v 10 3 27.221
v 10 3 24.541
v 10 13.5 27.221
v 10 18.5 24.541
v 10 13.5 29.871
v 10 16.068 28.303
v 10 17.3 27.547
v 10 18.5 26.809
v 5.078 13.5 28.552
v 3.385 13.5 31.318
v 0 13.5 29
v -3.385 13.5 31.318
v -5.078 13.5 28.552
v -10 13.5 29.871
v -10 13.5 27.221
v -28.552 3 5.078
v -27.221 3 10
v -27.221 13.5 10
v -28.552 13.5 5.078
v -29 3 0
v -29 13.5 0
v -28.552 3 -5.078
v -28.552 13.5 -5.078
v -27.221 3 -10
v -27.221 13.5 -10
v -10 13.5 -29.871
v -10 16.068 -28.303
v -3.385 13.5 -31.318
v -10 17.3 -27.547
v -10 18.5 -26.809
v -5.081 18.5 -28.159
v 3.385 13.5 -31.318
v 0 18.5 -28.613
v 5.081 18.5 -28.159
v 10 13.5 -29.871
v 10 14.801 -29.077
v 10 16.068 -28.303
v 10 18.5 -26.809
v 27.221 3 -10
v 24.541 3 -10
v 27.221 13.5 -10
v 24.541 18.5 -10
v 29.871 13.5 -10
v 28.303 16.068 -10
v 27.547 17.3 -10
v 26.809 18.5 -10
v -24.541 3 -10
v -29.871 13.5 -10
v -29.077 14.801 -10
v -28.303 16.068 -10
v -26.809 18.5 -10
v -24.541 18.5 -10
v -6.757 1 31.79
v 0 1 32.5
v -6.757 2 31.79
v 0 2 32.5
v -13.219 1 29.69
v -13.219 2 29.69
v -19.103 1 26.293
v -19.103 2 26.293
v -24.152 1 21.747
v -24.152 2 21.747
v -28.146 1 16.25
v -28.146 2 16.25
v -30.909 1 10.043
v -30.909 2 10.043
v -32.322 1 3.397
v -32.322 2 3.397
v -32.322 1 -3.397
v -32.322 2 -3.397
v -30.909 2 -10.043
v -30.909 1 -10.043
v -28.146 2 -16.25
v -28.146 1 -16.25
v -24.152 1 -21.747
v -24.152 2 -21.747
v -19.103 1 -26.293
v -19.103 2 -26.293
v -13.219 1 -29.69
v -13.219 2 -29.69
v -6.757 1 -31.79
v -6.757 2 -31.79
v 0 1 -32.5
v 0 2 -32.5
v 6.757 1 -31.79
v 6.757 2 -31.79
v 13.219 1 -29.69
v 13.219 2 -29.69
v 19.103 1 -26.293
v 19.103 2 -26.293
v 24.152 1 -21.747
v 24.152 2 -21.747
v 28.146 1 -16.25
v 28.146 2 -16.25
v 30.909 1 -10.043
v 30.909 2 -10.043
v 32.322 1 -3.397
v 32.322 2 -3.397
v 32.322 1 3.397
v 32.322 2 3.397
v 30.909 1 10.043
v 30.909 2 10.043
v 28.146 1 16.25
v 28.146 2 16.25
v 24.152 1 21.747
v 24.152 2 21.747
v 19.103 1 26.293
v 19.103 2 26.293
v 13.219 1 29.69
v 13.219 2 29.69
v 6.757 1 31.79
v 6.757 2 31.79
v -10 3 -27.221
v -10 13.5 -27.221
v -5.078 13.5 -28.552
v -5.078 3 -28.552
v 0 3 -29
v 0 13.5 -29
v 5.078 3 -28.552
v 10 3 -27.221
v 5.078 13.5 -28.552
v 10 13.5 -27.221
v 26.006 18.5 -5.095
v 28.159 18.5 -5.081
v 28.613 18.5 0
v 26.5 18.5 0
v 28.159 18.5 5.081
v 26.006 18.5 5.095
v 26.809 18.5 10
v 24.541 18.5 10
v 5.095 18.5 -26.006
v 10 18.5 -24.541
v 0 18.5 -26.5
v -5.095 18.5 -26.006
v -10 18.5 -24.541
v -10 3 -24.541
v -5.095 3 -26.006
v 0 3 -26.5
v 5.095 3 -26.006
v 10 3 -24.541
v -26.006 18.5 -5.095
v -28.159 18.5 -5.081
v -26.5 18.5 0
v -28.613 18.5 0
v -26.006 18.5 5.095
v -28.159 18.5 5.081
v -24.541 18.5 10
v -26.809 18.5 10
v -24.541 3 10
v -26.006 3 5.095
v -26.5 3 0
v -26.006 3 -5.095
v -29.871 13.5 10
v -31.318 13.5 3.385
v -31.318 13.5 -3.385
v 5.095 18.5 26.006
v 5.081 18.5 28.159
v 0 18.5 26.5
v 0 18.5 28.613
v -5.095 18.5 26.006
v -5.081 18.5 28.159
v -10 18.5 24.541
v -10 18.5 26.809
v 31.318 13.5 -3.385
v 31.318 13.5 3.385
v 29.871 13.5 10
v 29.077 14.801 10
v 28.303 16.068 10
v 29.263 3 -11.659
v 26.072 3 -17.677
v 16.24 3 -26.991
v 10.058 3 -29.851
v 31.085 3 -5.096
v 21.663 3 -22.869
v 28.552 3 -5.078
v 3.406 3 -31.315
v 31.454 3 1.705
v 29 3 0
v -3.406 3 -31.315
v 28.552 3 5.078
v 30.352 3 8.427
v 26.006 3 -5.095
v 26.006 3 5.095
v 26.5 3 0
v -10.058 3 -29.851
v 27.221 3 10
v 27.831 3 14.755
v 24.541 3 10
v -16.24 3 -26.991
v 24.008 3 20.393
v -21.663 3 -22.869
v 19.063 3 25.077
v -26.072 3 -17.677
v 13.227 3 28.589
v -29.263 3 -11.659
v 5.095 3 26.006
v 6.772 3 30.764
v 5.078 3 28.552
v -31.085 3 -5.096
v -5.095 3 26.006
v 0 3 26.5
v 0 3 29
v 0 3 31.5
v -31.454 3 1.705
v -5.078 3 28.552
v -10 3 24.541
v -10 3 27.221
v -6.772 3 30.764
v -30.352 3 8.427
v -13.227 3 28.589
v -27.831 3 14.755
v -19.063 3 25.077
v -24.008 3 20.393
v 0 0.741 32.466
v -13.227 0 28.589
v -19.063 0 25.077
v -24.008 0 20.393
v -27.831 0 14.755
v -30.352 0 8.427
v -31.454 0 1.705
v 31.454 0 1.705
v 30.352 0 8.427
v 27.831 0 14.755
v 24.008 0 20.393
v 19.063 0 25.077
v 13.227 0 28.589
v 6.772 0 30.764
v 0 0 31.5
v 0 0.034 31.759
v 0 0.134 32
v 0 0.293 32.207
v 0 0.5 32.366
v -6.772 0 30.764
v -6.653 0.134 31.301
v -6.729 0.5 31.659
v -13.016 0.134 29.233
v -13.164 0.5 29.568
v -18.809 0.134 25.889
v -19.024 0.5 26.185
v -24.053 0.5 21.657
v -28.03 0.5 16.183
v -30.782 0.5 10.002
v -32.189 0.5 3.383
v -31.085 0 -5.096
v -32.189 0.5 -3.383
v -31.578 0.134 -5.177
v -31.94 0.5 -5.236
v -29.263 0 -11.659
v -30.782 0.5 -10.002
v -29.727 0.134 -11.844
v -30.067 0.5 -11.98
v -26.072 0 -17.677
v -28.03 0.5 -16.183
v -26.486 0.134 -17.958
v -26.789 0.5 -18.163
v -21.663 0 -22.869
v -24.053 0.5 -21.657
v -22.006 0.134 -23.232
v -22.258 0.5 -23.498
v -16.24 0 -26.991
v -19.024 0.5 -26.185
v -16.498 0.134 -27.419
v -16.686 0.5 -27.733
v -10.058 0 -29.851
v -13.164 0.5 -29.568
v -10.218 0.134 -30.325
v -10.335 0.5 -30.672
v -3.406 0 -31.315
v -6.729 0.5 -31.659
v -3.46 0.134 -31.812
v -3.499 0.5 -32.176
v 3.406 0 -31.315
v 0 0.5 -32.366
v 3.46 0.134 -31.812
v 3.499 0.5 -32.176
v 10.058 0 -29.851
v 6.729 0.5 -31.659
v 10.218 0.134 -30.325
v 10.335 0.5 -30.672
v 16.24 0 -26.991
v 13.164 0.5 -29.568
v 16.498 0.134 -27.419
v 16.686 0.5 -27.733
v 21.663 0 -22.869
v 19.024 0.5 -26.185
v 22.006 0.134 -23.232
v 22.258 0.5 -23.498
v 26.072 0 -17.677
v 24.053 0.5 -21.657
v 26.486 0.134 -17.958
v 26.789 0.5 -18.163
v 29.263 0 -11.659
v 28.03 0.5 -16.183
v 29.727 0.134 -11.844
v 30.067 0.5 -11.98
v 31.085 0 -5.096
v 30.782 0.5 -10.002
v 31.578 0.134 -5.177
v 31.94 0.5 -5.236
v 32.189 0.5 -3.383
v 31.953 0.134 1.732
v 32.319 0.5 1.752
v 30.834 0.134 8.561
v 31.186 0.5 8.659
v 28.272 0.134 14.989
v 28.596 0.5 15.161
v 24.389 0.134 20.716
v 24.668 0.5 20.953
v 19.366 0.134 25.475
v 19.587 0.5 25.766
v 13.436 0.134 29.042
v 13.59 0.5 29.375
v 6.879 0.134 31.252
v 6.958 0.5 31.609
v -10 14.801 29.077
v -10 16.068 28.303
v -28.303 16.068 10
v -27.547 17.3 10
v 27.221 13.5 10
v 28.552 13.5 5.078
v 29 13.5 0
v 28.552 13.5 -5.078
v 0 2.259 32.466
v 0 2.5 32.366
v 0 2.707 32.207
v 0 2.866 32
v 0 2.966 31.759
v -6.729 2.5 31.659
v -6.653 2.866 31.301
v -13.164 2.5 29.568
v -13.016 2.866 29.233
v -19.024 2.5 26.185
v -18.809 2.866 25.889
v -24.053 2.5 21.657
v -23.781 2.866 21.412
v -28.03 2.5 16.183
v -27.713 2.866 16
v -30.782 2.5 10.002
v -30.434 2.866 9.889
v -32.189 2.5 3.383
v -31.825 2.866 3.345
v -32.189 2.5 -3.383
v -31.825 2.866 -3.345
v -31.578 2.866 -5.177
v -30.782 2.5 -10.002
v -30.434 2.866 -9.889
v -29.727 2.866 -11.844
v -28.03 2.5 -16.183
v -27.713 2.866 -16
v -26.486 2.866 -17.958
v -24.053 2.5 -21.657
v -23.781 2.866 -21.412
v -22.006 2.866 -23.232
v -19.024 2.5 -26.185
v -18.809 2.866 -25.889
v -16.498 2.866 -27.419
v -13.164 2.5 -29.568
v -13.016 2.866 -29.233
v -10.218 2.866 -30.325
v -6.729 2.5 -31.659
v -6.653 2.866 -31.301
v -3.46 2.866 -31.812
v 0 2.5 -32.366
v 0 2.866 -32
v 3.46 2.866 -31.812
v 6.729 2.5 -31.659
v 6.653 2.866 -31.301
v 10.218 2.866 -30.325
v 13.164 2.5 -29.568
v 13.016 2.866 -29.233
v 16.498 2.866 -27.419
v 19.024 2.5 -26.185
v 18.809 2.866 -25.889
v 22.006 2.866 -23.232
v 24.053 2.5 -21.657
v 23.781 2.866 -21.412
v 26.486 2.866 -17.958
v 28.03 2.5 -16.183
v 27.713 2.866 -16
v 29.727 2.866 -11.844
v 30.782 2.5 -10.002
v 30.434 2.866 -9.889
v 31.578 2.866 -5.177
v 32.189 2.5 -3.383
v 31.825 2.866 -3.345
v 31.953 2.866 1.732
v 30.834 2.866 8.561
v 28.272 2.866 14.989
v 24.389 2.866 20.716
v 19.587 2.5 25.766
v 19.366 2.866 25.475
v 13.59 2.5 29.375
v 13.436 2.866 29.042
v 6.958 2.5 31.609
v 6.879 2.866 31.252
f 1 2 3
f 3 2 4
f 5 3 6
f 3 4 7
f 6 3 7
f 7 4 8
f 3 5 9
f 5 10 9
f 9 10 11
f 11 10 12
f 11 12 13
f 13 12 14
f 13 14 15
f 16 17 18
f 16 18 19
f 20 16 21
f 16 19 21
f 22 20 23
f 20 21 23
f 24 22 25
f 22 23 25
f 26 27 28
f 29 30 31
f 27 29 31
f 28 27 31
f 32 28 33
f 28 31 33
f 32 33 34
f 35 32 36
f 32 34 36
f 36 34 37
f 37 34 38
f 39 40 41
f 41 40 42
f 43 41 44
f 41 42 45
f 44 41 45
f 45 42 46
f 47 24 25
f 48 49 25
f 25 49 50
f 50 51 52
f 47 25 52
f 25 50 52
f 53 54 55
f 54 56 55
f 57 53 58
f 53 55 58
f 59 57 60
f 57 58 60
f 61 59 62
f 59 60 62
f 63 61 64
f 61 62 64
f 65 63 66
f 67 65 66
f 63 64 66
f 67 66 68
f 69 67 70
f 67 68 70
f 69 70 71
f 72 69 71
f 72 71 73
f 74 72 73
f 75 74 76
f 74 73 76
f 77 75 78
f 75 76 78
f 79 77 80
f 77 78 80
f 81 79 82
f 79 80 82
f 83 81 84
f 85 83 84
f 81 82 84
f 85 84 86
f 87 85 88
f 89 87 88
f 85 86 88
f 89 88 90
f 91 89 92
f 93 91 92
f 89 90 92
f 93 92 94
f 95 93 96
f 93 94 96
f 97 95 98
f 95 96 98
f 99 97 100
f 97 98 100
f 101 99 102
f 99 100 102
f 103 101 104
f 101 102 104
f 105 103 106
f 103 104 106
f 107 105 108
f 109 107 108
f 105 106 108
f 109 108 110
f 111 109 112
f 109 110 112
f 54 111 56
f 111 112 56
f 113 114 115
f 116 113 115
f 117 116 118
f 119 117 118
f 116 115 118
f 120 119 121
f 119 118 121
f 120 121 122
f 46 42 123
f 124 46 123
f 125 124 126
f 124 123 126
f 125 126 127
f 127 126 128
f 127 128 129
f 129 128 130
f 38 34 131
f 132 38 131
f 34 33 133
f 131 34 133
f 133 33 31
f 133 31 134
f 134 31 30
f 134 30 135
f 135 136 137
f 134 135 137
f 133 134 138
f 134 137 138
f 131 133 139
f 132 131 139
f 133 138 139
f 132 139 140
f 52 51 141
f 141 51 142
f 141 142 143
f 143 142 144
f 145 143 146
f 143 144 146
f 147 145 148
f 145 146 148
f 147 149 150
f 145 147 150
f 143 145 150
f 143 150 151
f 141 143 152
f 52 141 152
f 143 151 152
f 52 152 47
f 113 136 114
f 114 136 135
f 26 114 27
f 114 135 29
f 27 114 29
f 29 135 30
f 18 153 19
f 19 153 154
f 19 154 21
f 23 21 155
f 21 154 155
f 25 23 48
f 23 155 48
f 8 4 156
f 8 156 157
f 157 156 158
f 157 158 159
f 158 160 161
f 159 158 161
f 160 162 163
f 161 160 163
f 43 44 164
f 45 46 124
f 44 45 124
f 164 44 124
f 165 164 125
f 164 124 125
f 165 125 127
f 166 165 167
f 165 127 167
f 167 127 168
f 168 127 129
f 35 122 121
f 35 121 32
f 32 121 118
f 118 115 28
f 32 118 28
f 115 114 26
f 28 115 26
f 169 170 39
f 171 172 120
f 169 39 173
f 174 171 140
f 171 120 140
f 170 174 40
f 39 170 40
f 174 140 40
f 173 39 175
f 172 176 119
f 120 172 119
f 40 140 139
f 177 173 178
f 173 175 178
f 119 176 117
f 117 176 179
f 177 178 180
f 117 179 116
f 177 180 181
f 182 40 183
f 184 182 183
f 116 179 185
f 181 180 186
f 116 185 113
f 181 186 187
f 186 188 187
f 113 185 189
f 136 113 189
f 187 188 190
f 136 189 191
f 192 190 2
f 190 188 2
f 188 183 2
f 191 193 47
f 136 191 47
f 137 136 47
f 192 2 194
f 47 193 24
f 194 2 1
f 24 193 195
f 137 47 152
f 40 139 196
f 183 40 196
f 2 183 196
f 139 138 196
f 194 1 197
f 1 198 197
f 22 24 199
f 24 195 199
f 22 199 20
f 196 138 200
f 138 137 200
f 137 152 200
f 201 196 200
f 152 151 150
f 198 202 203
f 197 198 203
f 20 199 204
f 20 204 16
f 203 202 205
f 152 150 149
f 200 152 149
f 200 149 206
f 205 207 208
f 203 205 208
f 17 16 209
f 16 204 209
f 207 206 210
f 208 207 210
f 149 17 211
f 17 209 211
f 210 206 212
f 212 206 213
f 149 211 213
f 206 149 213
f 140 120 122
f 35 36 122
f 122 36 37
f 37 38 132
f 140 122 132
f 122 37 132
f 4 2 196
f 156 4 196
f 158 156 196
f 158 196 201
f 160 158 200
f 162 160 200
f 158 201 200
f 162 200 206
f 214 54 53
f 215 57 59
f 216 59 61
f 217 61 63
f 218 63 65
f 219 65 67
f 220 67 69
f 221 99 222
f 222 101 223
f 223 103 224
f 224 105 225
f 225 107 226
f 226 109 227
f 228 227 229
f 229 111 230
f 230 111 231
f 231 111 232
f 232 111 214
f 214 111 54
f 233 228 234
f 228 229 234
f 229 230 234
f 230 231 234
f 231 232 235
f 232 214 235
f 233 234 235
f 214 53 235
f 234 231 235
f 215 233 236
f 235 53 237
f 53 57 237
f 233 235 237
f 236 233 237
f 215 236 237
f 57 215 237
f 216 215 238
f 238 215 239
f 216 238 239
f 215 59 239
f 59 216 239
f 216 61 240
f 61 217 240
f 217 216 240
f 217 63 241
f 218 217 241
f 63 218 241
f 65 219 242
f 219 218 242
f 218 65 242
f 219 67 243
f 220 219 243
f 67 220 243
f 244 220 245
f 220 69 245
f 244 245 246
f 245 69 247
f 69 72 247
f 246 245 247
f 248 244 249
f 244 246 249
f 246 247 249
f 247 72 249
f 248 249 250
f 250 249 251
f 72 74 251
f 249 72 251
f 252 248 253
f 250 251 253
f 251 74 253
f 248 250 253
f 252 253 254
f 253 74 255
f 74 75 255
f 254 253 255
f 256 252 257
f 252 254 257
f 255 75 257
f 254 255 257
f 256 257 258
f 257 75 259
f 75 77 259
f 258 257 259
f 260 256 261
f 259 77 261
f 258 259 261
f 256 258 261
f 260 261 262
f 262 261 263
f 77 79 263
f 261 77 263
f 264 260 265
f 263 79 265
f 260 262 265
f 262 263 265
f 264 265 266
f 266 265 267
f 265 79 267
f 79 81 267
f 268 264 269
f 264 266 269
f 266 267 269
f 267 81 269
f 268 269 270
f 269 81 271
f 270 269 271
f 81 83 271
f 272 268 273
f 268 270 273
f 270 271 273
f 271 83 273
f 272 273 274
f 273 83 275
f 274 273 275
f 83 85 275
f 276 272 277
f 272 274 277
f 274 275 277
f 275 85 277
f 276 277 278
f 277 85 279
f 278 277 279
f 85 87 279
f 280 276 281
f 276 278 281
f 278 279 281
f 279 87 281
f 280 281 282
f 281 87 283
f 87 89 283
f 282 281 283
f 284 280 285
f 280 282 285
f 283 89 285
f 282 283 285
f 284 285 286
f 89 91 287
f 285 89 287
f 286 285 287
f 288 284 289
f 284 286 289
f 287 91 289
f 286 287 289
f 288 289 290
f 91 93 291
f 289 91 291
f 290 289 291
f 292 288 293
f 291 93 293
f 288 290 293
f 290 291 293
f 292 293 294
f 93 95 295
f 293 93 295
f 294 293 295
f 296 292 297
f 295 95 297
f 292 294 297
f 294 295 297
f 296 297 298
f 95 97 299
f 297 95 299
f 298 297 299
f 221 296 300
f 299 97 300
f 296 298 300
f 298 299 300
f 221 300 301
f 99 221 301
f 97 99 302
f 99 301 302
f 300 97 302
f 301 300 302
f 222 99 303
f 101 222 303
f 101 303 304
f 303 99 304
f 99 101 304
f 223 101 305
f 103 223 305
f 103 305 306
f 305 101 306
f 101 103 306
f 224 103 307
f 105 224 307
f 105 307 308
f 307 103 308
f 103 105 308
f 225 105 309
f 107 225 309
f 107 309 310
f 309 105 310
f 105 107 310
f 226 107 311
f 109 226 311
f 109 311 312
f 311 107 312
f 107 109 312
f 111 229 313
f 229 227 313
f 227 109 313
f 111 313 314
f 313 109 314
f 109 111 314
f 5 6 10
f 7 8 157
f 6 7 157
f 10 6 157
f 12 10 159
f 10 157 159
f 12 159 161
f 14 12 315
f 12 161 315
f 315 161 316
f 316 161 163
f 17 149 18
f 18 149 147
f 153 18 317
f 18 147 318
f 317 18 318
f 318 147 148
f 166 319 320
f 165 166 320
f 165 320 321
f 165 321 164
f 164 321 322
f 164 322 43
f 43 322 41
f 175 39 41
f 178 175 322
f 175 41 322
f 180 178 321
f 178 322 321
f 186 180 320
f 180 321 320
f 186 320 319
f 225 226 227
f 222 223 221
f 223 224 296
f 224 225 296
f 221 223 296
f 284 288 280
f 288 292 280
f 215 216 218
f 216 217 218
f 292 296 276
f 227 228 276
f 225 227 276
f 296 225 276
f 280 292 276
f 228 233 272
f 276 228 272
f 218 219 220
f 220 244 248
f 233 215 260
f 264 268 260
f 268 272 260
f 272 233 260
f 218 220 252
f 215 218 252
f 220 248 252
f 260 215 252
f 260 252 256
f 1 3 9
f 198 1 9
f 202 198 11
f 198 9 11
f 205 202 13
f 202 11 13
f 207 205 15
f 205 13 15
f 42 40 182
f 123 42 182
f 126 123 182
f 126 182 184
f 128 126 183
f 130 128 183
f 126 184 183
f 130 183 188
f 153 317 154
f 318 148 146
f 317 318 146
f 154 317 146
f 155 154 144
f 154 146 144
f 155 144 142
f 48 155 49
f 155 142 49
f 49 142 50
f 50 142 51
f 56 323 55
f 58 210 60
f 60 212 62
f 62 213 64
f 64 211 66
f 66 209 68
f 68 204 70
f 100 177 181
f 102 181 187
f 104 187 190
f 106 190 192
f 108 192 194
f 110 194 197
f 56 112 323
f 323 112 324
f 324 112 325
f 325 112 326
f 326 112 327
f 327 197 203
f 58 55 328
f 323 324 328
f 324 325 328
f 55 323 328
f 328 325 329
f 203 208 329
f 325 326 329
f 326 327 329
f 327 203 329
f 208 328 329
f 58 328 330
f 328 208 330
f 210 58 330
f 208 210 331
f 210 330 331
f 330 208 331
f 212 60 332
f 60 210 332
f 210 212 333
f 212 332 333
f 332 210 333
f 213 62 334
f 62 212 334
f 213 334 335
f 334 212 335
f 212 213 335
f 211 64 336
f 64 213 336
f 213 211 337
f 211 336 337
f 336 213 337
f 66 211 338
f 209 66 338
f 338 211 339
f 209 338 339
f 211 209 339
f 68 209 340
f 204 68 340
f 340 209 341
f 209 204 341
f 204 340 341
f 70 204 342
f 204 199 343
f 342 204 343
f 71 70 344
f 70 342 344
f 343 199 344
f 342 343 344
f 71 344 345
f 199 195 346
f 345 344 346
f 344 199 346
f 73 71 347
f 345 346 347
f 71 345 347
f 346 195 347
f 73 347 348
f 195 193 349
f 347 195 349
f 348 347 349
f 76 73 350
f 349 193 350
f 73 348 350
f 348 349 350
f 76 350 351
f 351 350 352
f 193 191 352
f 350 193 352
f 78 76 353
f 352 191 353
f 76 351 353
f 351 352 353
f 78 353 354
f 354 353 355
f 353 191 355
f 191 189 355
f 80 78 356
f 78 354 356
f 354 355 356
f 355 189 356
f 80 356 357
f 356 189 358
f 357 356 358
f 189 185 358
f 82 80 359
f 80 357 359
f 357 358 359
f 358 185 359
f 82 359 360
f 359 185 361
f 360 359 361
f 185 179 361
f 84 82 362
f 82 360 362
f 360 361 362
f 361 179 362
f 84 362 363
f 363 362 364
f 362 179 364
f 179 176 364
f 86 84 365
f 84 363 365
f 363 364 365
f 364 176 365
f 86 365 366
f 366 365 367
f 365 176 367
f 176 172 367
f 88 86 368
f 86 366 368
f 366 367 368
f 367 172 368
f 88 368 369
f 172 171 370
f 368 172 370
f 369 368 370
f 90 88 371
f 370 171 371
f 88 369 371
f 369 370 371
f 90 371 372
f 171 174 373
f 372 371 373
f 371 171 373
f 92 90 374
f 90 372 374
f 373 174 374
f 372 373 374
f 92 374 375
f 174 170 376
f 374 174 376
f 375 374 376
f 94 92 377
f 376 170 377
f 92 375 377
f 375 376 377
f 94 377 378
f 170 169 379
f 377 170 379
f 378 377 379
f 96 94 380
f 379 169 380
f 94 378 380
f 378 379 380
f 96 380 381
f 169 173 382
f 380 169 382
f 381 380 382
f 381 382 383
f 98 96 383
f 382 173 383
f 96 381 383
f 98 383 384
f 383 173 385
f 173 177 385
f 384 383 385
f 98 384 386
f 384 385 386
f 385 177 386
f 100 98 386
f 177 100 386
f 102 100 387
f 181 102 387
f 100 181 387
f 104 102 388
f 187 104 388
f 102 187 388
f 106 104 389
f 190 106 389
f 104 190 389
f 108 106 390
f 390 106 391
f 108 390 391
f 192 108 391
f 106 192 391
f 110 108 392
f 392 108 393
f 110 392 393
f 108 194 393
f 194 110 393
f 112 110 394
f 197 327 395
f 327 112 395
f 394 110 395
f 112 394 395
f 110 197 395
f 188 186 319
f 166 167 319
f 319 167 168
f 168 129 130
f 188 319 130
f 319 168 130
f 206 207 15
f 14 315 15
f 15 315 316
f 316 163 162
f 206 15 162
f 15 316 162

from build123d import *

# Parameters (mm, degrees)
CUT_EXTRUDE_1_REACH = 51.545


with BuildPart() as part:
    # Эскиз1 → Повернуть1 (revolve)
    with BuildSketch(Plane.XY, mode=Mode.PRIVATE) as revolve_1_sk:
        with BuildLine():
            Line((0, 0), (-31.5, 0))
            ThreePointArc((-31.5, 0), (-32.207106781, 0.292893219), (-32.5, 1))
            Line((-32.5, 1), (-32.5, 2))
            ThreePointArc((-32.5, 2), (-32.207106781, 2.707106781), (-31.5, 3))
            Line((-31.5, 3), (-29, 3))
            Line((-29, 3), (-29, 13.5))
            Line((-29, 13.5), (-31.5, 13.5))
            Line((-31.5, 13.5), (-28.613248654, 18.5))
            Line((-28.613248654, 18.5), (-26.5, 18.5))
            Line((-26.5, 18.5), (-26.5, 3))
            Line((-26.5, 3), (0, 3))
            Line((0, 3), (0, 0))
        make_face()
    revolve(revolve_1_sk.sketch.rotate(Axis((0, 0, 0), (0, -1, 0)), 270), axis=Axis((0, 0, 0), (0, -1, 0)))

    # Вырез-Вытянуть1: up to this face of the body (flat: up to its plane)
    cut_extrude_1_end = Plane(part.part.faces().sort_by_distance((0, 3, -30.609045456))[0])
    # Эскиз2 → Вырез-Вытянуть1 (cut, up to the picked face)
    with BuildSketch(Plane(origin=(0, 18.5, 0), x_dir=(1, 0, 0), z_dir=(0, 1, 0)), mode=Mode.PRIVATE) as cut_extrude_1_sk1:
        with BuildLine():
            Line((-10, 26.8089164), (-10, 40.856644609))
            ThreePointArc((-10, 40.856644609), (-29.742775667, 29.742775667), (-40.856644609, 10))
            Line((-40.856644609, 10), (-26.8089164, 10))
            ThreePointArc((-26.8089164, 10), (-20.232622155, 20.232622155), (-10, 26.8089164))
        make_face()
    cut_extrude_1_tool1 = split(extrude(cut_extrude_1_sk1.sketch, amount=-CUT_EXTRUDE_1_REACH, mode=Mode.PRIVATE), bisect_by=cut_extrude_1_end, keep=Keep.BOTH, mode=Mode.PRIVATE)
    # Эскиз2 → Вырез-Вытянуть1 (cut, up to the picked face)
    with BuildSketch(Plane(origin=(0, 18.5, 0), x_dir=(1, 0, 0), z_dir=(0, 1, 0)), mode=Mode.PRIVATE) as cut_extrude_1_sk2:
        with BuildLine():
            ThreePointArc((26.8089164, 10), (20.232622155, 20.232622155), (10, 26.8089164))
            Line((10, 26.8089164), (10, 24.540782384))
            ThreePointArc((10, 24.540782384), (18.738329701, 18.738329701), (24.540782384, 10))
            Line((24.540782384, 10), (26.8089164, 10))
        make_face()
    cut_extrude_1_tool2 = split(extrude(cut_extrude_1_sk2.sketch, amount=-CUT_EXTRUDE_1_REACH, mode=Mode.PRIVATE), bisect_by=cut_extrude_1_end, keep=Keep.BOTH, mode=Mode.PRIVATE)
    # Эскиз2 → Вырез-Вытянуть1 (cut, up to the picked face)
    with BuildSketch(Plane(origin=(0, 18.5, 0), x_dir=(1, 0, 0), z_dir=(0, 1, 0)), mode=Mode.PRIVATE) as cut_extrude_1_sk3:
        with BuildLine():
            ThreePointArc((40.856644609, 10), (29.742775667, 29.742775667), (10, 40.856644609))
            Line((10, 40.856644609), (10, 26.8089164))
            ThreePointArc((10, 26.8089164), (20.232622155, 20.232622155), (26.8089164, 10))
            Line((26.8089164, 10), (40.856644609, 10))
        make_face()
    cut_extrude_1_tool3 = split(extrude(cut_extrude_1_sk3.sketch, amount=-CUT_EXTRUDE_1_REACH, mode=Mode.PRIVATE), bisect_by=cut_extrude_1_end, keep=Keep.BOTH, mode=Mode.PRIVATE)
    # Эскиз2 → Вырез-Вытянуть1 (cut, up to the picked face)
    with BuildSketch(Plane(origin=(0, 18.5, 0), x_dir=(1, 0, 0), z_dir=(0, 1, 0)), mode=Mode.PRIVATE) as cut_extrude_1_sk4:
        with BuildLine():
            ThreePointArc((10, -40.856644609), (29.742775667, -29.742775667), (40.856644609, -10))
            Line((40.856644609, -10), (26.8089164, -10))
            ThreePointArc((26.8089164, -10), (20.232622155, -20.232622155), (10, -26.8089164))
            Line((10, -26.8089164), (10, -40.856644609))
        make_face()
    cut_extrude_1_tool4 = split(extrude(cut_extrude_1_sk4.sketch, amount=-CUT_EXTRUDE_1_REACH, mode=Mode.PRIVATE), bisect_by=cut_extrude_1_end, keep=Keep.BOTH, mode=Mode.PRIVATE)
    # Эскиз2 → Вырез-Вытянуть1 (cut, up to the picked face)
    with BuildSketch(Plane(origin=(0, 18.5, 0), x_dir=(1, 0, 0), z_dir=(0, 1, 0)), mode=Mode.PRIVATE) as cut_extrude_1_sk5:
        with BuildLine():
            ThreePointArc((10, -26.8089164), (20.232622155, -20.232622155), (26.8089164, -10))
            Line((26.8089164, -10), (24.540782384, -10))
            ThreePointArc((24.540782384, -10), (18.738329701, -18.738329701), (10, -24.540782384))
            Line((10, -24.540782384), (10, -26.8089164))
        make_face()
    cut_extrude_1_tool5 = split(extrude(cut_extrude_1_sk5.sketch, amount=-CUT_EXTRUDE_1_REACH, mode=Mode.PRIVATE), bisect_by=cut_extrude_1_end, keep=Keep.BOTH, mode=Mode.PRIVATE)
    # Эскиз2 → Вырез-Вытянуть1 (cut, up to the picked face)
    with BuildSketch(Plane(origin=(0, 18.5, 0), x_dir=(1, 0, 0), z_dir=(0, 1, 0)), mode=Mode.PRIVATE) as cut_extrude_1_sk6:
        with BuildLine():
            Line((-26.8089164, -10), (-40.856644609, -10))
            ThreePointArc((-40.856644609, -10), (-29.742775667, -29.742775667), (-10, -40.856644609))
            Line((-10, -40.856644609), (-10, -26.8089164))
            ThreePointArc((-10, -26.8089164), (-20.232622155, -20.232622155), (-26.8089164, -10))
        make_face()
    cut_extrude_1_tool6 = split(extrude(cut_extrude_1_sk6.sketch, amount=-CUT_EXTRUDE_1_REACH, mode=Mode.PRIVATE), bisect_by=cut_extrude_1_end, keep=Keep.BOTH, mode=Mode.PRIVATE)
    # Эскиз2 → Вырез-Вытянуть1 (cut, up to the picked face)
    with BuildSketch(Plane(origin=(0, 18.5, 0), x_dir=(1, 0, 0), z_dir=(0, 1, 0)), mode=Mode.PRIVATE) as cut_extrude_1_sk7:
        with BuildLine():
            Line((-24.540782384, -10), (-26.8089164, -10))
            ThreePointArc((-26.8089164, -10), (-20.232622155, -20.232622155), (-10, -26.8089164))
            Line((-10, -26.8089164), (-10, -24.540782384))
            ThreePointArc((-10, -24.540782384), (-18.738329701, -18.738329701), (-24.540782384, -10))
        make_face()
    cut_extrude_1_tool7 = split(extrude(cut_extrude_1_sk7.sketch, amount=-CUT_EXTRUDE_1_REACH, mode=Mode.PRIVATE), bisect_by=cut_extrude_1_end, keep=Keep.BOTH, mode=Mode.PRIVATE)
    # Эскиз2 → Вырез-Вытянуть1 (cut, up to the picked face)
    with BuildSketch(Plane(origin=(0, 18.5, 0), x_dir=(1, 0, 0), z_dir=(0, 1, 0)), mode=Mode.PRIVATE) as cut_extrude_1_sk8:
        with BuildLine():
            Line((-10, 24.540782384), (-10, 26.8089164))
            ThreePointArc((-10, 26.8089164), (-20.232622155, 20.232622155), (-26.8089164, 10))
            Line((-26.8089164, 10), (-24.540782384, 10))
            ThreePointArc((-24.540782384, 10), (-18.738329701, 18.738329701), (-10, 24.540782384))
        make_face()
    cut_extrude_1_tool8 = split(extrude(cut_extrude_1_sk8.sketch, amount=-CUT_EXTRUDE_1_REACH, mode=Mode.PRIVATE), bisect_by=cut_extrude_1_end, keep=Keep.BOTH, mode=Mode.PRIVATE)
    add(cut_extrude_1_tool1.solids().sort_by(Axis((-24.400112, 18.5, -24.400112), (0, -1, 0)))[0], mode=Mode.SUBTRACT)
    add(cut_extrude_1_tool2.solids().sort_by(Axis((18.950359, 18.5, -18.950359), (0, -1, 0)))[0], mode=Mode.SUBTRACT)
    add(cut_extrude_1_tool3.solids().sort_by(Axis((24.400112, 18.5, -24.400112), (0, -1, 0)))[0], mode=Mode.SUBTRACT)
    add(cut_extrude_1_tool4.solids().sort_by(Axis((24.400112, 18.5, 24.400112), (0, -1, 0)))[0], mode=Mode.SUBTRACT)
    add(cut_extrude_1_tool5.solids().sort_by(Axis((18.950359, 18.5, 18.950359), (0, -1, 0)))[0], mode=Mode.SUBTRACT)
    add(cut_extrude_1_tool6.solids().sort_by(Axis((-24.400112, 18.5, 24.400112), (0, -1, 0)))[0], mode=Mode.SUBTRACT)
    add(cut_extrude_1_tool7.solids().sort_by(Axis((-18.950359, 18.5, 18.950359), (0, -1, 0)))[0], mode=Mode.SUBTRACT)
    add(cut_extrude_1_tool8.solids().sort_by(Axis((-18.950359, 18.5, -18.950359), (0, -1, 0)))[0], mode=Mode.SUBTRACT)


solid = part.part
